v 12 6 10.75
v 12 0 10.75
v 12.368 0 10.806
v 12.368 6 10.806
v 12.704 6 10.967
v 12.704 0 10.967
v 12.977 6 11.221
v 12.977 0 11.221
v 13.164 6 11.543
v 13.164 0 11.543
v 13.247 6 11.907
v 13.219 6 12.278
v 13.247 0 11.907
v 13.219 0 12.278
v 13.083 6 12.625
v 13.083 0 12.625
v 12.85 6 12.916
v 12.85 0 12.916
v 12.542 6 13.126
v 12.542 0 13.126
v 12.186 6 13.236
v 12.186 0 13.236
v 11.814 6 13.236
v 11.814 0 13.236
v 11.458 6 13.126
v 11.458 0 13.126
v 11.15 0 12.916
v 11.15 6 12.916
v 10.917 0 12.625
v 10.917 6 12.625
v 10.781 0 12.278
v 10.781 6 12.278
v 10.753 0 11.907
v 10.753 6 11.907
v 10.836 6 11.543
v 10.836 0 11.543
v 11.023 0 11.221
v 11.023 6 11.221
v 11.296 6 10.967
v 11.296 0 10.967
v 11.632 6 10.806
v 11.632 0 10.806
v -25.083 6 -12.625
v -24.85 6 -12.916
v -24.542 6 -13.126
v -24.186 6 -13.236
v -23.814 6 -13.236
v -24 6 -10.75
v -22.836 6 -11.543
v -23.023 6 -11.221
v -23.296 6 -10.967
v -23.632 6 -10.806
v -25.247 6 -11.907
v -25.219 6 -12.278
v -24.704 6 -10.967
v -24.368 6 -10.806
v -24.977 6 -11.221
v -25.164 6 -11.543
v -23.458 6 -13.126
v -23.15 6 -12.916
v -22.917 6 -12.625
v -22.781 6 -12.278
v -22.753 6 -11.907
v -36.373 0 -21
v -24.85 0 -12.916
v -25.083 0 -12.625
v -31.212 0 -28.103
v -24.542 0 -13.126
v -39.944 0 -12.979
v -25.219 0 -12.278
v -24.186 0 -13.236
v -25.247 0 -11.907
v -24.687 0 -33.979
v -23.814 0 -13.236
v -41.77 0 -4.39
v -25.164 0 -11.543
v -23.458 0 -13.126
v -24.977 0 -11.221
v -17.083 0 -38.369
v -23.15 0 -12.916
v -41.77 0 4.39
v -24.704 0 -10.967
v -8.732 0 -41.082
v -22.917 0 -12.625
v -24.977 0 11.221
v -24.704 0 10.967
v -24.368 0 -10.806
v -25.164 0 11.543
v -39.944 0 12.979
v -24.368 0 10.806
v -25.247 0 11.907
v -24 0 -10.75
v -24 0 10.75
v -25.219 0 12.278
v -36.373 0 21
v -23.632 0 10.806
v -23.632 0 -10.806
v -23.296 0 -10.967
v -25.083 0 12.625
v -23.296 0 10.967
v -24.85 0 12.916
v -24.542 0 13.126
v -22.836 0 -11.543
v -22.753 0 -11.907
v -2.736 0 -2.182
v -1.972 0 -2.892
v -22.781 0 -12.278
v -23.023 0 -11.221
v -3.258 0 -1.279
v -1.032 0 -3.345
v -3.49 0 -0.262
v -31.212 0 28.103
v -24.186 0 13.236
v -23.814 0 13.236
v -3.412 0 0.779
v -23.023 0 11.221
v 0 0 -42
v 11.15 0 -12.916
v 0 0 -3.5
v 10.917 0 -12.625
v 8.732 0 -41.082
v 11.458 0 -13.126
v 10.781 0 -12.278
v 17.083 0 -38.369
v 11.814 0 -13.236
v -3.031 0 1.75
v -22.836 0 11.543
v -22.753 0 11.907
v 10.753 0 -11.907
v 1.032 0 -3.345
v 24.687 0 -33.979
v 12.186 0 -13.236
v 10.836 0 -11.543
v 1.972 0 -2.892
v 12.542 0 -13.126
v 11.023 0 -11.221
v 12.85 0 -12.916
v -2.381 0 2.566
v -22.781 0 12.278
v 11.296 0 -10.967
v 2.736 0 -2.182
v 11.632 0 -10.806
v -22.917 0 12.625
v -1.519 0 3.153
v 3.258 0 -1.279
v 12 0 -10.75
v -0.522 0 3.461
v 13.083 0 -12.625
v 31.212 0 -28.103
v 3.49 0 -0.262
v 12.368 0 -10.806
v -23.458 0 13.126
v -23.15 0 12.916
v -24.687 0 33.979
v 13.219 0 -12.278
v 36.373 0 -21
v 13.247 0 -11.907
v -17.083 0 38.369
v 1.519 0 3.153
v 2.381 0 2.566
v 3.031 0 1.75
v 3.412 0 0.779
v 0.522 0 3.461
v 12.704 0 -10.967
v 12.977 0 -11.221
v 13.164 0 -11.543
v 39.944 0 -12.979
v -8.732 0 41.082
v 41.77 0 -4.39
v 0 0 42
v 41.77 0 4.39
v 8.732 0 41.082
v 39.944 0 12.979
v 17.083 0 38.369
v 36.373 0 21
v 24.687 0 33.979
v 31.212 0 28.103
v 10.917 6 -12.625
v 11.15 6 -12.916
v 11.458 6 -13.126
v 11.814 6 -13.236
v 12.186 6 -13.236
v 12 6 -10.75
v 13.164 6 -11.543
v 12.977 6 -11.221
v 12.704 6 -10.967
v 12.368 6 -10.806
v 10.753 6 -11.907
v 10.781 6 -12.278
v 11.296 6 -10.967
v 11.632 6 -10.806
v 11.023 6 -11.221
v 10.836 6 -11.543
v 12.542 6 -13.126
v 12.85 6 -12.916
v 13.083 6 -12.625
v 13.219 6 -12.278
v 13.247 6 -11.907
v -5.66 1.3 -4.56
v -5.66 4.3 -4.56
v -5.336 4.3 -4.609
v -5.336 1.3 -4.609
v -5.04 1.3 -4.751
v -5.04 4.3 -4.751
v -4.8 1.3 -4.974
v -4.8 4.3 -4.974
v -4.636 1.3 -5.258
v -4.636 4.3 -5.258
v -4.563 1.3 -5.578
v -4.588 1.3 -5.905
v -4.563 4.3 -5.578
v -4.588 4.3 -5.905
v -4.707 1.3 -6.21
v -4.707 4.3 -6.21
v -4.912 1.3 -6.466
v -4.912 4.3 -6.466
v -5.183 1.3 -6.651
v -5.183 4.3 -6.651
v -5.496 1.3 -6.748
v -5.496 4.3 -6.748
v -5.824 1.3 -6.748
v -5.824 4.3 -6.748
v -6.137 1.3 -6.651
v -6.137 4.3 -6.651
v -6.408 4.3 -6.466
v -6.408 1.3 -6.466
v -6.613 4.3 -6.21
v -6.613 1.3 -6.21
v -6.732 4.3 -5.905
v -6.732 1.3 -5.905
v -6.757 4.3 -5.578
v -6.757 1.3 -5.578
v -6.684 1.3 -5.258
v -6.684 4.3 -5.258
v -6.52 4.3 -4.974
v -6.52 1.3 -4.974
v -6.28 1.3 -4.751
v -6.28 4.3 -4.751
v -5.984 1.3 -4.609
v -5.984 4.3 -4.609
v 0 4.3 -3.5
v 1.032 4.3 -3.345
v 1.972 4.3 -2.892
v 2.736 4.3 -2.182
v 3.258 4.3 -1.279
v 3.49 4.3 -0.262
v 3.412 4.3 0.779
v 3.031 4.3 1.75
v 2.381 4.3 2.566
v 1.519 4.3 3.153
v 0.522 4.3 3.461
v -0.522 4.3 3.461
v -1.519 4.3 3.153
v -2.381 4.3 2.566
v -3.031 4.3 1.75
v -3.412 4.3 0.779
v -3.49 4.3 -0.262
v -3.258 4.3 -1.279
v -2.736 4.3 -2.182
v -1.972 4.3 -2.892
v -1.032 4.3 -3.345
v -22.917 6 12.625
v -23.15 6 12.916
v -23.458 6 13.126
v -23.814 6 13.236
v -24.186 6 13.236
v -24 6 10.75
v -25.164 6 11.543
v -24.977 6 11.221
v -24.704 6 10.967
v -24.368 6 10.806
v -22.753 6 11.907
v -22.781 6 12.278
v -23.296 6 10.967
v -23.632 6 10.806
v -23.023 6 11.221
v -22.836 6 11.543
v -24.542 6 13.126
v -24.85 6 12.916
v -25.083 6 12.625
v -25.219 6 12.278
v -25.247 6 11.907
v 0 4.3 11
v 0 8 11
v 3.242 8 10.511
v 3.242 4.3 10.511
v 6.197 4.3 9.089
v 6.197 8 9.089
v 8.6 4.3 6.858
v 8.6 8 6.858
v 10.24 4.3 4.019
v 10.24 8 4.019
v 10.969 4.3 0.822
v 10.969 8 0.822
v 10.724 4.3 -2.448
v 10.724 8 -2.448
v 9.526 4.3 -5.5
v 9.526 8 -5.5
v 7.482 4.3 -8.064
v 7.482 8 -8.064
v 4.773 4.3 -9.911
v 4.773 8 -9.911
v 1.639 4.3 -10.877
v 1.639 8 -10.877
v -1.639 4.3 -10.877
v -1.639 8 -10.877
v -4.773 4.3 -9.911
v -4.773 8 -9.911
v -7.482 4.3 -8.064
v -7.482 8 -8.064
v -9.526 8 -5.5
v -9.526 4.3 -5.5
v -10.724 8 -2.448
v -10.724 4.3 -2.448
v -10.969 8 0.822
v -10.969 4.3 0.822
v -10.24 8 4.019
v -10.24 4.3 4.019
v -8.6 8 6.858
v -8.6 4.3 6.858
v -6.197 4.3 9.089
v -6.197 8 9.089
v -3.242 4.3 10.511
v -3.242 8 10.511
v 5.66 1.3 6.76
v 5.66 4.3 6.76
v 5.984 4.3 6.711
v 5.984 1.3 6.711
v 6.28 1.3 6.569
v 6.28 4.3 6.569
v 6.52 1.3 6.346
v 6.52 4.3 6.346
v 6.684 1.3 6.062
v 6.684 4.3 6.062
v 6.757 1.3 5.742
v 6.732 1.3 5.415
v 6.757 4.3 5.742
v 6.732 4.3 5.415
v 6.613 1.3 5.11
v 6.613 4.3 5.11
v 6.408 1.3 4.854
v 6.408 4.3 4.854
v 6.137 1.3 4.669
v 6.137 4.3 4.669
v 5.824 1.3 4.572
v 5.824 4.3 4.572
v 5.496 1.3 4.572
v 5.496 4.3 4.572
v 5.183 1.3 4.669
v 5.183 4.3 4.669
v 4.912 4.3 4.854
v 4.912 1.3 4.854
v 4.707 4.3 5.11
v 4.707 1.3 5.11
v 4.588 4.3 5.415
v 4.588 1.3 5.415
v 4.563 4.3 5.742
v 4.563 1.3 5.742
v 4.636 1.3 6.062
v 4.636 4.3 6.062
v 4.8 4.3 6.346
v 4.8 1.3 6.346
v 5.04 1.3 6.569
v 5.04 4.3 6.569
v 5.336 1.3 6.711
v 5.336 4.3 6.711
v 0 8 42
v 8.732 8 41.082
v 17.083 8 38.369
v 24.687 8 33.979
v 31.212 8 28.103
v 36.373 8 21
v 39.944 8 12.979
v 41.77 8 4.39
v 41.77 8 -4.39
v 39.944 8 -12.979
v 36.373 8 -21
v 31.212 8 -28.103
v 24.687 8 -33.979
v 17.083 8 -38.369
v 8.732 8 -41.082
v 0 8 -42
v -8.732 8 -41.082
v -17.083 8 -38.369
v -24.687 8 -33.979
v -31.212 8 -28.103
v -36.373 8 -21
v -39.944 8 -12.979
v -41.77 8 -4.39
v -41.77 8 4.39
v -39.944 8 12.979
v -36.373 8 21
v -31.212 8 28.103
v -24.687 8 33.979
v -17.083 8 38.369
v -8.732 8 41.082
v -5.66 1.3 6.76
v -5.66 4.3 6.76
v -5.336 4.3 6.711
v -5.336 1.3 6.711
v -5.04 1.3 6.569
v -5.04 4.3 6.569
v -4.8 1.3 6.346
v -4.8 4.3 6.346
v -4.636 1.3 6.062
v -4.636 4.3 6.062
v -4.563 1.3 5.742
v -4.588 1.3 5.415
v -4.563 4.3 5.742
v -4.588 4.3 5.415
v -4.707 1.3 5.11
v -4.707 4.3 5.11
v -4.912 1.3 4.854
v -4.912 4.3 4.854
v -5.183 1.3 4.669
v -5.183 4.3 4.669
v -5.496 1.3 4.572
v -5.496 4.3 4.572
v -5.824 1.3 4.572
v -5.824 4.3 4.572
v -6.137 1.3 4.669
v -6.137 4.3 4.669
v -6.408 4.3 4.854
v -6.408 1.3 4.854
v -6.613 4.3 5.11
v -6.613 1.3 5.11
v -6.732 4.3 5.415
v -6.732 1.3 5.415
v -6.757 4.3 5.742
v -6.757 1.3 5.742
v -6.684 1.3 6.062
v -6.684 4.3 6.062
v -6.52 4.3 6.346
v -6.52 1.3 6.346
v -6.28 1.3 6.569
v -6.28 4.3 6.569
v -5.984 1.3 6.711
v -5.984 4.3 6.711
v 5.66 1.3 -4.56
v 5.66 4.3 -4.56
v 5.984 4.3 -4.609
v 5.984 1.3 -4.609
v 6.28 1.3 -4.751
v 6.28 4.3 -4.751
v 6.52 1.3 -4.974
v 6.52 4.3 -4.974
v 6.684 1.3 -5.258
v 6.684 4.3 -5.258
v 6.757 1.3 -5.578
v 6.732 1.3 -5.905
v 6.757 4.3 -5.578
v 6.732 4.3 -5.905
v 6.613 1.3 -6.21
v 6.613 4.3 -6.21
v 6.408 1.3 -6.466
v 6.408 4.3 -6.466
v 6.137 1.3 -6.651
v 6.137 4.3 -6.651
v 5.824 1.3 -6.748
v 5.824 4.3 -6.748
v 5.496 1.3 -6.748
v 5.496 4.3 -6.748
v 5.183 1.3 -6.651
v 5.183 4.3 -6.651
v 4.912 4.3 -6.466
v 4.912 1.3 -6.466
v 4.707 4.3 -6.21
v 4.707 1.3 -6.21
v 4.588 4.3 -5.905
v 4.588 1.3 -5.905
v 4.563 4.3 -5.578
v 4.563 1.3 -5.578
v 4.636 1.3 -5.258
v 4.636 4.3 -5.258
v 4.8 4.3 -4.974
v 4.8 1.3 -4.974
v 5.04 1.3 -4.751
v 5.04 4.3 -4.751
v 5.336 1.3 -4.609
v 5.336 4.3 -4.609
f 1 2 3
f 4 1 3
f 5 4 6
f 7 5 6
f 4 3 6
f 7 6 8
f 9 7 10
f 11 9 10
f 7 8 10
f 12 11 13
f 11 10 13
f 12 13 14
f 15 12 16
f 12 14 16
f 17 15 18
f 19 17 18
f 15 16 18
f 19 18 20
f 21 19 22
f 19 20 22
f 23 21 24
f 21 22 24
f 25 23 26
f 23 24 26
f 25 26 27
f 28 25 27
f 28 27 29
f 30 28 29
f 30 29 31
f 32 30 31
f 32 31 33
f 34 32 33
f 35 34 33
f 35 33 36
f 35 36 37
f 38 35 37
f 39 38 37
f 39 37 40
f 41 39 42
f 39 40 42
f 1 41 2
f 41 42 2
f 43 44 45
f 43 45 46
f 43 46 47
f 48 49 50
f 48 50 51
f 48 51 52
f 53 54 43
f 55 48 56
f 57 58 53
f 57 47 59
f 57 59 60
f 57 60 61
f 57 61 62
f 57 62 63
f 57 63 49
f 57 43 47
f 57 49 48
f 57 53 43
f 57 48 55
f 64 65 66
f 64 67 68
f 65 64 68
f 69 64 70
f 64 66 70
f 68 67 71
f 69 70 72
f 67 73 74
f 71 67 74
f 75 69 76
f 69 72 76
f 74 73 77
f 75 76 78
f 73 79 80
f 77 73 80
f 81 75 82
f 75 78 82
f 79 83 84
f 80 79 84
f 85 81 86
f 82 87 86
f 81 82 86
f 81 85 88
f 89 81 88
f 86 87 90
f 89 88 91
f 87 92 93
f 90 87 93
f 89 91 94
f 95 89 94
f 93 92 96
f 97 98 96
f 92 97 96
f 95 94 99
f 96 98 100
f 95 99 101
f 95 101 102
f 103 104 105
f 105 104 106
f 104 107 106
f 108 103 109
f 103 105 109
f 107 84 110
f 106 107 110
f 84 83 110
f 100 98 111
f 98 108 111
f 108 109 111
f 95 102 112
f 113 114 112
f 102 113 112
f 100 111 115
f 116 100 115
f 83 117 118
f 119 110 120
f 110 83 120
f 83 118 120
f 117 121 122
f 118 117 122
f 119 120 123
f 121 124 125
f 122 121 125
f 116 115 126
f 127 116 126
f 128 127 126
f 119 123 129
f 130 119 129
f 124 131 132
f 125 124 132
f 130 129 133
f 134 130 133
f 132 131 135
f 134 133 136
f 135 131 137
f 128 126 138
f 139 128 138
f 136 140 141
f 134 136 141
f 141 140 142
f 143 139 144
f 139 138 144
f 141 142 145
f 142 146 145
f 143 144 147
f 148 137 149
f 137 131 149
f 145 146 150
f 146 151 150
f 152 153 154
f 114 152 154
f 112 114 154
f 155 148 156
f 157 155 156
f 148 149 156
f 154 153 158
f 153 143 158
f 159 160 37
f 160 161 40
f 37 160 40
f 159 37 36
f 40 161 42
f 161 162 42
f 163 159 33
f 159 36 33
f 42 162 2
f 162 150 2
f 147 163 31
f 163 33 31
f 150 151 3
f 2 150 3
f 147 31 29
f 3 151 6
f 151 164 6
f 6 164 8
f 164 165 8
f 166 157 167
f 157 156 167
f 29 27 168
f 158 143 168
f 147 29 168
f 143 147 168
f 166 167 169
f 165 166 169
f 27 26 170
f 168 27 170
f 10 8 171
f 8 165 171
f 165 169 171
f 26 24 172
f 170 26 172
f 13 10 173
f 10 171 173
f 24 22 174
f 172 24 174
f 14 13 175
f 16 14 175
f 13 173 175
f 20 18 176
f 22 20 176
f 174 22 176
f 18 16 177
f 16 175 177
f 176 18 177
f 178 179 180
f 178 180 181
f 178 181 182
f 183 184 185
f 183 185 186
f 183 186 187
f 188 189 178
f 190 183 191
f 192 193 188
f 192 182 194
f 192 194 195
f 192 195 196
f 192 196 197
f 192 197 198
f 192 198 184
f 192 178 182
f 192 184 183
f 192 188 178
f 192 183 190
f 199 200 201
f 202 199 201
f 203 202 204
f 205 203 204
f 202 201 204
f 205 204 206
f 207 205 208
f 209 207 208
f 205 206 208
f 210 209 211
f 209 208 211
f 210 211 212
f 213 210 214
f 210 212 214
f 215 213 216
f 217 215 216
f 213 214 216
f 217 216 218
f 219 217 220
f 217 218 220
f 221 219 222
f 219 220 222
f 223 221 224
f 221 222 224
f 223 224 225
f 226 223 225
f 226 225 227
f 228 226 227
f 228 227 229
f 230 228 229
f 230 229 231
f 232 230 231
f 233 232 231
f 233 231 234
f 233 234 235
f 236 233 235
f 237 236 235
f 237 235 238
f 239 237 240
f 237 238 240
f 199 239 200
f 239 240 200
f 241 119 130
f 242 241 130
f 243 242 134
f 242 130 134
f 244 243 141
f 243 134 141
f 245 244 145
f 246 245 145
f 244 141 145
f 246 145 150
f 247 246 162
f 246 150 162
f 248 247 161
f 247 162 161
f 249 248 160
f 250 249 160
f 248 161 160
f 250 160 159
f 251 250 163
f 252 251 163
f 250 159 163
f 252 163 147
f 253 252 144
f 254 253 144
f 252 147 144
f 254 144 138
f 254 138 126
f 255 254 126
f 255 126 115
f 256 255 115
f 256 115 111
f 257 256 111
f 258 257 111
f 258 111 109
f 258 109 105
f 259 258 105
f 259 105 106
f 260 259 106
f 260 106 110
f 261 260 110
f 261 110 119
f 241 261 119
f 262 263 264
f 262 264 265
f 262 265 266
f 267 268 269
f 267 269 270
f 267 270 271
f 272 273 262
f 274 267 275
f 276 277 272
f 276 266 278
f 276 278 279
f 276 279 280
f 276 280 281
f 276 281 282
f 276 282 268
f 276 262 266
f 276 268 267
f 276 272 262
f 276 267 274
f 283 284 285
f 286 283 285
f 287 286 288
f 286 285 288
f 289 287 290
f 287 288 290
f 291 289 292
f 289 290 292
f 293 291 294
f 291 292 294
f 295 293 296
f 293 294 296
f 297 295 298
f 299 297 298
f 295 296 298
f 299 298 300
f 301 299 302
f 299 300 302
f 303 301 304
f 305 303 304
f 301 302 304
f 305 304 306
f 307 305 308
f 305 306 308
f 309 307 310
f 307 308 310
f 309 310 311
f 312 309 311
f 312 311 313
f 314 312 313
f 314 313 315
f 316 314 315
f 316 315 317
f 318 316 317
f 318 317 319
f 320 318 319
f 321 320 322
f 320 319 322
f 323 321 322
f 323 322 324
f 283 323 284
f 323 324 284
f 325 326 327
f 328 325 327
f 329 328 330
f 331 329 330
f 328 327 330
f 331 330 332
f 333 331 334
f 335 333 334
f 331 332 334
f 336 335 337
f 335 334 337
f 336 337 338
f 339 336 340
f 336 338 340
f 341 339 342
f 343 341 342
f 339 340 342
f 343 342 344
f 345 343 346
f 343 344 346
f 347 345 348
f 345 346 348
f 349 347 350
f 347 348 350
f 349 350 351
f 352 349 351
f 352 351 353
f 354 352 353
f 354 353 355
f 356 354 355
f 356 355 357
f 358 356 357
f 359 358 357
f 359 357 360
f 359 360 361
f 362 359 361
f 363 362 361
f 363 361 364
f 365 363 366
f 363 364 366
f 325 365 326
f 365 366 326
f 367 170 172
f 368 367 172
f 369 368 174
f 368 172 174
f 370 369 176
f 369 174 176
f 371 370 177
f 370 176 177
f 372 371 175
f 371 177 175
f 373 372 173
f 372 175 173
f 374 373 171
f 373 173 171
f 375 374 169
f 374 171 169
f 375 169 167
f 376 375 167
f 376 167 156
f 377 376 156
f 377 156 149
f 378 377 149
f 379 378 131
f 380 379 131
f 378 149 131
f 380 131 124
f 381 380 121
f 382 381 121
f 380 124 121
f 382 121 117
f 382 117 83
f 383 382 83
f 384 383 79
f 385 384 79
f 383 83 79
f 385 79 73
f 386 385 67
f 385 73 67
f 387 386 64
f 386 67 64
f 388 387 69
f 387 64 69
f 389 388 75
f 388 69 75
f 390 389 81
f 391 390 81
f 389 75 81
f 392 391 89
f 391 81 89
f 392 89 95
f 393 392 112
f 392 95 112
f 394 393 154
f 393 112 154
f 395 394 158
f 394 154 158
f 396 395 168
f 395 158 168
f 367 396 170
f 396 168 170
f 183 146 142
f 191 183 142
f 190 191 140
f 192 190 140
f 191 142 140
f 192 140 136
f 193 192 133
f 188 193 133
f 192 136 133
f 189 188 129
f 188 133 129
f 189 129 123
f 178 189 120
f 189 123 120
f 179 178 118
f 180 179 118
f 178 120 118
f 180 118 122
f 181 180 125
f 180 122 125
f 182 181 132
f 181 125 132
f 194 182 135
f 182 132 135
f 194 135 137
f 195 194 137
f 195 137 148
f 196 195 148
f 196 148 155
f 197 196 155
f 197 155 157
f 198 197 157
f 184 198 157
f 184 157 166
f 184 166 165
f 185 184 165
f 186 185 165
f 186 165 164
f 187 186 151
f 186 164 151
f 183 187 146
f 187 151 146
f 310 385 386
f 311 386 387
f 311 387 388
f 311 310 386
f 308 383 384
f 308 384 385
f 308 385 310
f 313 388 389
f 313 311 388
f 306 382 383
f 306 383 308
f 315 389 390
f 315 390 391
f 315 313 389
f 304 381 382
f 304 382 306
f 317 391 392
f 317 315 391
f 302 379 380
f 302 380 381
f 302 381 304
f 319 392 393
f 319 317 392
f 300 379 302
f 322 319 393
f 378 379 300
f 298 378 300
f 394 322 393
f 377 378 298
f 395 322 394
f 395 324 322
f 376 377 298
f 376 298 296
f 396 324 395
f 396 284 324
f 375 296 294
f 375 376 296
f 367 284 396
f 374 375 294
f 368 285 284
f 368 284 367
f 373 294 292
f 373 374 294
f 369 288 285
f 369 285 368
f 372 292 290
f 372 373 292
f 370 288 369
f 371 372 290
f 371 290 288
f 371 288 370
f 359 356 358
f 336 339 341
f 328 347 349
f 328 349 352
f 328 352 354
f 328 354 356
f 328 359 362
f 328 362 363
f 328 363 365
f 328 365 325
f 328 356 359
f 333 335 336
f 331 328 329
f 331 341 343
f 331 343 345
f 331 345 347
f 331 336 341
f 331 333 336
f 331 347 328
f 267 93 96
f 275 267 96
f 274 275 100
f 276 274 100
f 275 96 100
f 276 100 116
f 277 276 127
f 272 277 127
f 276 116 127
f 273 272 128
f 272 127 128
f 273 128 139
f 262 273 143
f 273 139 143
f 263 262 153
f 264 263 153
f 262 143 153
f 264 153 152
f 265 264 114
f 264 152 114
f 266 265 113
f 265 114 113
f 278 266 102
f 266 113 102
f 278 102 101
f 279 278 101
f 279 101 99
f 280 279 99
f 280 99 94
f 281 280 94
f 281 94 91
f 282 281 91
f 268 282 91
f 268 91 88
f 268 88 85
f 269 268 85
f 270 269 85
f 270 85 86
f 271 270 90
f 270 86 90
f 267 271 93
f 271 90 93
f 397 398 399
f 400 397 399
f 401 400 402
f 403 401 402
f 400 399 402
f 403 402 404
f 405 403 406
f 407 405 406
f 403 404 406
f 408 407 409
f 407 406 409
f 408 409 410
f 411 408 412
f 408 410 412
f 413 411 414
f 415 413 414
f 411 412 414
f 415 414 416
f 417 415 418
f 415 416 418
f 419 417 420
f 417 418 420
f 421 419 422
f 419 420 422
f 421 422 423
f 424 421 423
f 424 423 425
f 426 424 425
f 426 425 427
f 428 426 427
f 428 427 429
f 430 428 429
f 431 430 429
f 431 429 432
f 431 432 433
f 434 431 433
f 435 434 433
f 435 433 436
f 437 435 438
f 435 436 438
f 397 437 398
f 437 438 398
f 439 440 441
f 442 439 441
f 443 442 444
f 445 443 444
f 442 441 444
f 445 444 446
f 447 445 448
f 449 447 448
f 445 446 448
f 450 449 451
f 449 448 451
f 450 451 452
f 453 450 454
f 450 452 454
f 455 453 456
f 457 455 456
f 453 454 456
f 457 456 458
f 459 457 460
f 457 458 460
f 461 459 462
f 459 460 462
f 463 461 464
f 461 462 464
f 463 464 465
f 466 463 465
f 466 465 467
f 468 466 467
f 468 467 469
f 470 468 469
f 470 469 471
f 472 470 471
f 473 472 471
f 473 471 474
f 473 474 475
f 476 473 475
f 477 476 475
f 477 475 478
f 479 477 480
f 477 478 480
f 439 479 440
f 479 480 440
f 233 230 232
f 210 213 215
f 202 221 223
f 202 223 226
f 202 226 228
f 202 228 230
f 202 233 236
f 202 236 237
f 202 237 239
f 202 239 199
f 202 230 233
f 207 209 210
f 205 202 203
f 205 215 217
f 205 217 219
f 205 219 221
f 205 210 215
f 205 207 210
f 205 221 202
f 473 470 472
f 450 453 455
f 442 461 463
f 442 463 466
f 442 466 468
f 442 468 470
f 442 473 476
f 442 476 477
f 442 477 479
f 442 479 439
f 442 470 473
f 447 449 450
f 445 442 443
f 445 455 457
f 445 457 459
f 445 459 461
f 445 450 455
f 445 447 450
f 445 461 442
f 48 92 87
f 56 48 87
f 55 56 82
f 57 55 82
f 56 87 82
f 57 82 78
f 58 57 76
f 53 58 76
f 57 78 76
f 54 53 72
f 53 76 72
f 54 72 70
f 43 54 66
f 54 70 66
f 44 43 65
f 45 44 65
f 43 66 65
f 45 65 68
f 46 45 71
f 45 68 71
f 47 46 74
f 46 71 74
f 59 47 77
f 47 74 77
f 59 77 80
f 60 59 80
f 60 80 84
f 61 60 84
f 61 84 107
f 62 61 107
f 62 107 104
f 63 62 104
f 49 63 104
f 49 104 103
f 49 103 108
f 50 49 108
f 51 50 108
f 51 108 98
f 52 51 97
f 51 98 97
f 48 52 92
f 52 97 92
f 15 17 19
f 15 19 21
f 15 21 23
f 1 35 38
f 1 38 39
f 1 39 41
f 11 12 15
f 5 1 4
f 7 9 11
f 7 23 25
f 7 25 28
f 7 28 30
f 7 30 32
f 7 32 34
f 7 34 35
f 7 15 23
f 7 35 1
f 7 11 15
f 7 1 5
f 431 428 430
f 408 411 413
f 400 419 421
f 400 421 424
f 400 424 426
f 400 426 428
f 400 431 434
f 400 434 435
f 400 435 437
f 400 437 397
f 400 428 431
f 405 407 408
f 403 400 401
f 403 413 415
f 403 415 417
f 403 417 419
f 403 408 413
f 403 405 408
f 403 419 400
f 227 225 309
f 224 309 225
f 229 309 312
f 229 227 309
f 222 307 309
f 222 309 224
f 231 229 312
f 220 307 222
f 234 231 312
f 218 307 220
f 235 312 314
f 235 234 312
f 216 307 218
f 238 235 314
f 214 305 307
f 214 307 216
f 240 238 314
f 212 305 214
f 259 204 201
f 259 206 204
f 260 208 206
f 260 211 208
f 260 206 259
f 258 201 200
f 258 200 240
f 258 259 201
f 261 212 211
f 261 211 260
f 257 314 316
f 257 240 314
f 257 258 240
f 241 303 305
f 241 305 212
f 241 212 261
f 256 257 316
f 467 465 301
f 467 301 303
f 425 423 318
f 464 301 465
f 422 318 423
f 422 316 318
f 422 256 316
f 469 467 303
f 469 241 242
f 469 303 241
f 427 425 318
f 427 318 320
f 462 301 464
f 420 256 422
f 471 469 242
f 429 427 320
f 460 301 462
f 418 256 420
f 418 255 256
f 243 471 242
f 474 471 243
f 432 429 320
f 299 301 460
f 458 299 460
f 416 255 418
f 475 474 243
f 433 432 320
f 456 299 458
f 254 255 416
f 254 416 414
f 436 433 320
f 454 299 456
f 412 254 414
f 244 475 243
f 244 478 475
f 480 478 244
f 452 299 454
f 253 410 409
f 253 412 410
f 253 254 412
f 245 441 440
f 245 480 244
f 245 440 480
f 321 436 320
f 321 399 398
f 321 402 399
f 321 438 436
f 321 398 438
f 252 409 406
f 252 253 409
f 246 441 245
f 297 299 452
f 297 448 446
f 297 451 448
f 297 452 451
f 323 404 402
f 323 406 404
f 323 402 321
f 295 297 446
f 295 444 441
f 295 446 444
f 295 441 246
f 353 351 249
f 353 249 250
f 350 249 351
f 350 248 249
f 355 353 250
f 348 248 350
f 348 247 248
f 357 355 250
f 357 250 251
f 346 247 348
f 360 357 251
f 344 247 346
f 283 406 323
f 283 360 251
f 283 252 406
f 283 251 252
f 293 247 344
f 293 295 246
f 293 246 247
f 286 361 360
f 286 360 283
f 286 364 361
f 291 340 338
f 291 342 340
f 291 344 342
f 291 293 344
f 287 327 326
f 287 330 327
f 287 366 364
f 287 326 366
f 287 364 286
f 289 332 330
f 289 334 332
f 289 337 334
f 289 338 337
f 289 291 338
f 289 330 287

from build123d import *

# Parameters (mm, degrees)
SCHIZZO1_R                   = 42
ESTRUSIONE_ESTRUSIONE1_DEPTH = 8
SCHIZZO2_R                   = 3.5
TAGLIO_ESTRUSIONE1_DEPTH     = 60.933296255
SCHIZZO4_R                   = 11
TAGLIO_ESTRUSIONE2_DEPTH     = 3.7
SCHIZZO5_R                   = 1.1
TAGLIO_ESTRUSIONE3_DEPTH     = 3
SCHIZZO6_R                   = 1.25
TAGLIO_ESTRUSIONE4_DEPTH     = 6


with BuildPart() as part:
    # Schizzo1 → Estrusione-Estrusione1 (new body)
    with BuildSketch(Plane(origin=(0, 0, 0), x_dir=(1, 0, 0), z_dir=(0, 1, 0))):
        with Locations(Location((0, 0, 0), (0, 0, 270))):
            Circle(SCHIZZO1_R)
    extrude(amount=ESTRUSIONE_ESTRUSIONE1_DEPTH)

    # Schizzo2 → Taglio-Estrusione1 (cut, through all)
    with BuildSketch(Plane.XZ):
        with Locations(Location((0, 0, 0), (0, 0, 270))):
            Circle(SCHIZZO2_R)
    extrude(amount=-TAGLIO_ESTRUSIONE1_DEPTH, mode=Mode.SUBTRACT)

    # Schizzo4 → Taglio-Estrusione2 (cut)
    with BuildSketch(Plane(origin=(0, 8, 0), x_dir=(1, 0, 0), z_dir=(0, 1, 0))):
        with Locations(Location((0, 0, 0), (0, 0, 270))):
            Circle(SCHIZZO4_R)
    extrude(amount=-TAGLIO_ESTRUSIONE2_DEPTH, mode=Mode.SUBTRACT)

    # Schizzo5 → Taglio-Estrusione3 (cut)
    with BuildSketch(Plane(origin=(0, 4.3, 0), x_dir=(1, 0, 0), z_dir=(0, 1, 0))):
        with Locations(Location((-5.66, 5.66, 0), (0, 0, 270))):
            Circle(SCHIZZO5_R)
        with Locations(Location((5.66, 5.66, 0), (0, 0, 270))):
            Circle(SCHIZZO5_R)
        with Locations(Location((5.66, -5.66, 0), (0, 0, 270))):
            Circle(SCHIZZO5_R)
        with Locations(Location((-5.66, -5.66, 0), (0, 0, 270))):
            Circle(SCHIZZO5_R)
    extrude(amount=-TAGLIO_ESTRUSIONE3_DEPTH, mode=Mode.SUBTRACT)

    # Schizzo6 → Taglio-Estrusione4 (cut)
    with BuildSketch(Plane.XZ):
        with Locations(Location((12, 12, 0), (0, 0, 270))):
            Circle(SCHIZZO6_R)
        with Locations(Location((12, -12, 0), (0, 0, 90))):
            Circle(SCHIZZO6_R)
        with Locations(Location((-24, 12, 0), (0, 0, 270))):
            Circle(SCHIZZO6_R)
        with Locations(Location((-24, -12, 0), (0, 0, 90))):
            Circle(SCHIZZO6_R)
    extrude(amount=-TAGLIO_ESTRUSIONE4_DEPTH, mode=Mode.SUBTRACT)


solid = part.part
